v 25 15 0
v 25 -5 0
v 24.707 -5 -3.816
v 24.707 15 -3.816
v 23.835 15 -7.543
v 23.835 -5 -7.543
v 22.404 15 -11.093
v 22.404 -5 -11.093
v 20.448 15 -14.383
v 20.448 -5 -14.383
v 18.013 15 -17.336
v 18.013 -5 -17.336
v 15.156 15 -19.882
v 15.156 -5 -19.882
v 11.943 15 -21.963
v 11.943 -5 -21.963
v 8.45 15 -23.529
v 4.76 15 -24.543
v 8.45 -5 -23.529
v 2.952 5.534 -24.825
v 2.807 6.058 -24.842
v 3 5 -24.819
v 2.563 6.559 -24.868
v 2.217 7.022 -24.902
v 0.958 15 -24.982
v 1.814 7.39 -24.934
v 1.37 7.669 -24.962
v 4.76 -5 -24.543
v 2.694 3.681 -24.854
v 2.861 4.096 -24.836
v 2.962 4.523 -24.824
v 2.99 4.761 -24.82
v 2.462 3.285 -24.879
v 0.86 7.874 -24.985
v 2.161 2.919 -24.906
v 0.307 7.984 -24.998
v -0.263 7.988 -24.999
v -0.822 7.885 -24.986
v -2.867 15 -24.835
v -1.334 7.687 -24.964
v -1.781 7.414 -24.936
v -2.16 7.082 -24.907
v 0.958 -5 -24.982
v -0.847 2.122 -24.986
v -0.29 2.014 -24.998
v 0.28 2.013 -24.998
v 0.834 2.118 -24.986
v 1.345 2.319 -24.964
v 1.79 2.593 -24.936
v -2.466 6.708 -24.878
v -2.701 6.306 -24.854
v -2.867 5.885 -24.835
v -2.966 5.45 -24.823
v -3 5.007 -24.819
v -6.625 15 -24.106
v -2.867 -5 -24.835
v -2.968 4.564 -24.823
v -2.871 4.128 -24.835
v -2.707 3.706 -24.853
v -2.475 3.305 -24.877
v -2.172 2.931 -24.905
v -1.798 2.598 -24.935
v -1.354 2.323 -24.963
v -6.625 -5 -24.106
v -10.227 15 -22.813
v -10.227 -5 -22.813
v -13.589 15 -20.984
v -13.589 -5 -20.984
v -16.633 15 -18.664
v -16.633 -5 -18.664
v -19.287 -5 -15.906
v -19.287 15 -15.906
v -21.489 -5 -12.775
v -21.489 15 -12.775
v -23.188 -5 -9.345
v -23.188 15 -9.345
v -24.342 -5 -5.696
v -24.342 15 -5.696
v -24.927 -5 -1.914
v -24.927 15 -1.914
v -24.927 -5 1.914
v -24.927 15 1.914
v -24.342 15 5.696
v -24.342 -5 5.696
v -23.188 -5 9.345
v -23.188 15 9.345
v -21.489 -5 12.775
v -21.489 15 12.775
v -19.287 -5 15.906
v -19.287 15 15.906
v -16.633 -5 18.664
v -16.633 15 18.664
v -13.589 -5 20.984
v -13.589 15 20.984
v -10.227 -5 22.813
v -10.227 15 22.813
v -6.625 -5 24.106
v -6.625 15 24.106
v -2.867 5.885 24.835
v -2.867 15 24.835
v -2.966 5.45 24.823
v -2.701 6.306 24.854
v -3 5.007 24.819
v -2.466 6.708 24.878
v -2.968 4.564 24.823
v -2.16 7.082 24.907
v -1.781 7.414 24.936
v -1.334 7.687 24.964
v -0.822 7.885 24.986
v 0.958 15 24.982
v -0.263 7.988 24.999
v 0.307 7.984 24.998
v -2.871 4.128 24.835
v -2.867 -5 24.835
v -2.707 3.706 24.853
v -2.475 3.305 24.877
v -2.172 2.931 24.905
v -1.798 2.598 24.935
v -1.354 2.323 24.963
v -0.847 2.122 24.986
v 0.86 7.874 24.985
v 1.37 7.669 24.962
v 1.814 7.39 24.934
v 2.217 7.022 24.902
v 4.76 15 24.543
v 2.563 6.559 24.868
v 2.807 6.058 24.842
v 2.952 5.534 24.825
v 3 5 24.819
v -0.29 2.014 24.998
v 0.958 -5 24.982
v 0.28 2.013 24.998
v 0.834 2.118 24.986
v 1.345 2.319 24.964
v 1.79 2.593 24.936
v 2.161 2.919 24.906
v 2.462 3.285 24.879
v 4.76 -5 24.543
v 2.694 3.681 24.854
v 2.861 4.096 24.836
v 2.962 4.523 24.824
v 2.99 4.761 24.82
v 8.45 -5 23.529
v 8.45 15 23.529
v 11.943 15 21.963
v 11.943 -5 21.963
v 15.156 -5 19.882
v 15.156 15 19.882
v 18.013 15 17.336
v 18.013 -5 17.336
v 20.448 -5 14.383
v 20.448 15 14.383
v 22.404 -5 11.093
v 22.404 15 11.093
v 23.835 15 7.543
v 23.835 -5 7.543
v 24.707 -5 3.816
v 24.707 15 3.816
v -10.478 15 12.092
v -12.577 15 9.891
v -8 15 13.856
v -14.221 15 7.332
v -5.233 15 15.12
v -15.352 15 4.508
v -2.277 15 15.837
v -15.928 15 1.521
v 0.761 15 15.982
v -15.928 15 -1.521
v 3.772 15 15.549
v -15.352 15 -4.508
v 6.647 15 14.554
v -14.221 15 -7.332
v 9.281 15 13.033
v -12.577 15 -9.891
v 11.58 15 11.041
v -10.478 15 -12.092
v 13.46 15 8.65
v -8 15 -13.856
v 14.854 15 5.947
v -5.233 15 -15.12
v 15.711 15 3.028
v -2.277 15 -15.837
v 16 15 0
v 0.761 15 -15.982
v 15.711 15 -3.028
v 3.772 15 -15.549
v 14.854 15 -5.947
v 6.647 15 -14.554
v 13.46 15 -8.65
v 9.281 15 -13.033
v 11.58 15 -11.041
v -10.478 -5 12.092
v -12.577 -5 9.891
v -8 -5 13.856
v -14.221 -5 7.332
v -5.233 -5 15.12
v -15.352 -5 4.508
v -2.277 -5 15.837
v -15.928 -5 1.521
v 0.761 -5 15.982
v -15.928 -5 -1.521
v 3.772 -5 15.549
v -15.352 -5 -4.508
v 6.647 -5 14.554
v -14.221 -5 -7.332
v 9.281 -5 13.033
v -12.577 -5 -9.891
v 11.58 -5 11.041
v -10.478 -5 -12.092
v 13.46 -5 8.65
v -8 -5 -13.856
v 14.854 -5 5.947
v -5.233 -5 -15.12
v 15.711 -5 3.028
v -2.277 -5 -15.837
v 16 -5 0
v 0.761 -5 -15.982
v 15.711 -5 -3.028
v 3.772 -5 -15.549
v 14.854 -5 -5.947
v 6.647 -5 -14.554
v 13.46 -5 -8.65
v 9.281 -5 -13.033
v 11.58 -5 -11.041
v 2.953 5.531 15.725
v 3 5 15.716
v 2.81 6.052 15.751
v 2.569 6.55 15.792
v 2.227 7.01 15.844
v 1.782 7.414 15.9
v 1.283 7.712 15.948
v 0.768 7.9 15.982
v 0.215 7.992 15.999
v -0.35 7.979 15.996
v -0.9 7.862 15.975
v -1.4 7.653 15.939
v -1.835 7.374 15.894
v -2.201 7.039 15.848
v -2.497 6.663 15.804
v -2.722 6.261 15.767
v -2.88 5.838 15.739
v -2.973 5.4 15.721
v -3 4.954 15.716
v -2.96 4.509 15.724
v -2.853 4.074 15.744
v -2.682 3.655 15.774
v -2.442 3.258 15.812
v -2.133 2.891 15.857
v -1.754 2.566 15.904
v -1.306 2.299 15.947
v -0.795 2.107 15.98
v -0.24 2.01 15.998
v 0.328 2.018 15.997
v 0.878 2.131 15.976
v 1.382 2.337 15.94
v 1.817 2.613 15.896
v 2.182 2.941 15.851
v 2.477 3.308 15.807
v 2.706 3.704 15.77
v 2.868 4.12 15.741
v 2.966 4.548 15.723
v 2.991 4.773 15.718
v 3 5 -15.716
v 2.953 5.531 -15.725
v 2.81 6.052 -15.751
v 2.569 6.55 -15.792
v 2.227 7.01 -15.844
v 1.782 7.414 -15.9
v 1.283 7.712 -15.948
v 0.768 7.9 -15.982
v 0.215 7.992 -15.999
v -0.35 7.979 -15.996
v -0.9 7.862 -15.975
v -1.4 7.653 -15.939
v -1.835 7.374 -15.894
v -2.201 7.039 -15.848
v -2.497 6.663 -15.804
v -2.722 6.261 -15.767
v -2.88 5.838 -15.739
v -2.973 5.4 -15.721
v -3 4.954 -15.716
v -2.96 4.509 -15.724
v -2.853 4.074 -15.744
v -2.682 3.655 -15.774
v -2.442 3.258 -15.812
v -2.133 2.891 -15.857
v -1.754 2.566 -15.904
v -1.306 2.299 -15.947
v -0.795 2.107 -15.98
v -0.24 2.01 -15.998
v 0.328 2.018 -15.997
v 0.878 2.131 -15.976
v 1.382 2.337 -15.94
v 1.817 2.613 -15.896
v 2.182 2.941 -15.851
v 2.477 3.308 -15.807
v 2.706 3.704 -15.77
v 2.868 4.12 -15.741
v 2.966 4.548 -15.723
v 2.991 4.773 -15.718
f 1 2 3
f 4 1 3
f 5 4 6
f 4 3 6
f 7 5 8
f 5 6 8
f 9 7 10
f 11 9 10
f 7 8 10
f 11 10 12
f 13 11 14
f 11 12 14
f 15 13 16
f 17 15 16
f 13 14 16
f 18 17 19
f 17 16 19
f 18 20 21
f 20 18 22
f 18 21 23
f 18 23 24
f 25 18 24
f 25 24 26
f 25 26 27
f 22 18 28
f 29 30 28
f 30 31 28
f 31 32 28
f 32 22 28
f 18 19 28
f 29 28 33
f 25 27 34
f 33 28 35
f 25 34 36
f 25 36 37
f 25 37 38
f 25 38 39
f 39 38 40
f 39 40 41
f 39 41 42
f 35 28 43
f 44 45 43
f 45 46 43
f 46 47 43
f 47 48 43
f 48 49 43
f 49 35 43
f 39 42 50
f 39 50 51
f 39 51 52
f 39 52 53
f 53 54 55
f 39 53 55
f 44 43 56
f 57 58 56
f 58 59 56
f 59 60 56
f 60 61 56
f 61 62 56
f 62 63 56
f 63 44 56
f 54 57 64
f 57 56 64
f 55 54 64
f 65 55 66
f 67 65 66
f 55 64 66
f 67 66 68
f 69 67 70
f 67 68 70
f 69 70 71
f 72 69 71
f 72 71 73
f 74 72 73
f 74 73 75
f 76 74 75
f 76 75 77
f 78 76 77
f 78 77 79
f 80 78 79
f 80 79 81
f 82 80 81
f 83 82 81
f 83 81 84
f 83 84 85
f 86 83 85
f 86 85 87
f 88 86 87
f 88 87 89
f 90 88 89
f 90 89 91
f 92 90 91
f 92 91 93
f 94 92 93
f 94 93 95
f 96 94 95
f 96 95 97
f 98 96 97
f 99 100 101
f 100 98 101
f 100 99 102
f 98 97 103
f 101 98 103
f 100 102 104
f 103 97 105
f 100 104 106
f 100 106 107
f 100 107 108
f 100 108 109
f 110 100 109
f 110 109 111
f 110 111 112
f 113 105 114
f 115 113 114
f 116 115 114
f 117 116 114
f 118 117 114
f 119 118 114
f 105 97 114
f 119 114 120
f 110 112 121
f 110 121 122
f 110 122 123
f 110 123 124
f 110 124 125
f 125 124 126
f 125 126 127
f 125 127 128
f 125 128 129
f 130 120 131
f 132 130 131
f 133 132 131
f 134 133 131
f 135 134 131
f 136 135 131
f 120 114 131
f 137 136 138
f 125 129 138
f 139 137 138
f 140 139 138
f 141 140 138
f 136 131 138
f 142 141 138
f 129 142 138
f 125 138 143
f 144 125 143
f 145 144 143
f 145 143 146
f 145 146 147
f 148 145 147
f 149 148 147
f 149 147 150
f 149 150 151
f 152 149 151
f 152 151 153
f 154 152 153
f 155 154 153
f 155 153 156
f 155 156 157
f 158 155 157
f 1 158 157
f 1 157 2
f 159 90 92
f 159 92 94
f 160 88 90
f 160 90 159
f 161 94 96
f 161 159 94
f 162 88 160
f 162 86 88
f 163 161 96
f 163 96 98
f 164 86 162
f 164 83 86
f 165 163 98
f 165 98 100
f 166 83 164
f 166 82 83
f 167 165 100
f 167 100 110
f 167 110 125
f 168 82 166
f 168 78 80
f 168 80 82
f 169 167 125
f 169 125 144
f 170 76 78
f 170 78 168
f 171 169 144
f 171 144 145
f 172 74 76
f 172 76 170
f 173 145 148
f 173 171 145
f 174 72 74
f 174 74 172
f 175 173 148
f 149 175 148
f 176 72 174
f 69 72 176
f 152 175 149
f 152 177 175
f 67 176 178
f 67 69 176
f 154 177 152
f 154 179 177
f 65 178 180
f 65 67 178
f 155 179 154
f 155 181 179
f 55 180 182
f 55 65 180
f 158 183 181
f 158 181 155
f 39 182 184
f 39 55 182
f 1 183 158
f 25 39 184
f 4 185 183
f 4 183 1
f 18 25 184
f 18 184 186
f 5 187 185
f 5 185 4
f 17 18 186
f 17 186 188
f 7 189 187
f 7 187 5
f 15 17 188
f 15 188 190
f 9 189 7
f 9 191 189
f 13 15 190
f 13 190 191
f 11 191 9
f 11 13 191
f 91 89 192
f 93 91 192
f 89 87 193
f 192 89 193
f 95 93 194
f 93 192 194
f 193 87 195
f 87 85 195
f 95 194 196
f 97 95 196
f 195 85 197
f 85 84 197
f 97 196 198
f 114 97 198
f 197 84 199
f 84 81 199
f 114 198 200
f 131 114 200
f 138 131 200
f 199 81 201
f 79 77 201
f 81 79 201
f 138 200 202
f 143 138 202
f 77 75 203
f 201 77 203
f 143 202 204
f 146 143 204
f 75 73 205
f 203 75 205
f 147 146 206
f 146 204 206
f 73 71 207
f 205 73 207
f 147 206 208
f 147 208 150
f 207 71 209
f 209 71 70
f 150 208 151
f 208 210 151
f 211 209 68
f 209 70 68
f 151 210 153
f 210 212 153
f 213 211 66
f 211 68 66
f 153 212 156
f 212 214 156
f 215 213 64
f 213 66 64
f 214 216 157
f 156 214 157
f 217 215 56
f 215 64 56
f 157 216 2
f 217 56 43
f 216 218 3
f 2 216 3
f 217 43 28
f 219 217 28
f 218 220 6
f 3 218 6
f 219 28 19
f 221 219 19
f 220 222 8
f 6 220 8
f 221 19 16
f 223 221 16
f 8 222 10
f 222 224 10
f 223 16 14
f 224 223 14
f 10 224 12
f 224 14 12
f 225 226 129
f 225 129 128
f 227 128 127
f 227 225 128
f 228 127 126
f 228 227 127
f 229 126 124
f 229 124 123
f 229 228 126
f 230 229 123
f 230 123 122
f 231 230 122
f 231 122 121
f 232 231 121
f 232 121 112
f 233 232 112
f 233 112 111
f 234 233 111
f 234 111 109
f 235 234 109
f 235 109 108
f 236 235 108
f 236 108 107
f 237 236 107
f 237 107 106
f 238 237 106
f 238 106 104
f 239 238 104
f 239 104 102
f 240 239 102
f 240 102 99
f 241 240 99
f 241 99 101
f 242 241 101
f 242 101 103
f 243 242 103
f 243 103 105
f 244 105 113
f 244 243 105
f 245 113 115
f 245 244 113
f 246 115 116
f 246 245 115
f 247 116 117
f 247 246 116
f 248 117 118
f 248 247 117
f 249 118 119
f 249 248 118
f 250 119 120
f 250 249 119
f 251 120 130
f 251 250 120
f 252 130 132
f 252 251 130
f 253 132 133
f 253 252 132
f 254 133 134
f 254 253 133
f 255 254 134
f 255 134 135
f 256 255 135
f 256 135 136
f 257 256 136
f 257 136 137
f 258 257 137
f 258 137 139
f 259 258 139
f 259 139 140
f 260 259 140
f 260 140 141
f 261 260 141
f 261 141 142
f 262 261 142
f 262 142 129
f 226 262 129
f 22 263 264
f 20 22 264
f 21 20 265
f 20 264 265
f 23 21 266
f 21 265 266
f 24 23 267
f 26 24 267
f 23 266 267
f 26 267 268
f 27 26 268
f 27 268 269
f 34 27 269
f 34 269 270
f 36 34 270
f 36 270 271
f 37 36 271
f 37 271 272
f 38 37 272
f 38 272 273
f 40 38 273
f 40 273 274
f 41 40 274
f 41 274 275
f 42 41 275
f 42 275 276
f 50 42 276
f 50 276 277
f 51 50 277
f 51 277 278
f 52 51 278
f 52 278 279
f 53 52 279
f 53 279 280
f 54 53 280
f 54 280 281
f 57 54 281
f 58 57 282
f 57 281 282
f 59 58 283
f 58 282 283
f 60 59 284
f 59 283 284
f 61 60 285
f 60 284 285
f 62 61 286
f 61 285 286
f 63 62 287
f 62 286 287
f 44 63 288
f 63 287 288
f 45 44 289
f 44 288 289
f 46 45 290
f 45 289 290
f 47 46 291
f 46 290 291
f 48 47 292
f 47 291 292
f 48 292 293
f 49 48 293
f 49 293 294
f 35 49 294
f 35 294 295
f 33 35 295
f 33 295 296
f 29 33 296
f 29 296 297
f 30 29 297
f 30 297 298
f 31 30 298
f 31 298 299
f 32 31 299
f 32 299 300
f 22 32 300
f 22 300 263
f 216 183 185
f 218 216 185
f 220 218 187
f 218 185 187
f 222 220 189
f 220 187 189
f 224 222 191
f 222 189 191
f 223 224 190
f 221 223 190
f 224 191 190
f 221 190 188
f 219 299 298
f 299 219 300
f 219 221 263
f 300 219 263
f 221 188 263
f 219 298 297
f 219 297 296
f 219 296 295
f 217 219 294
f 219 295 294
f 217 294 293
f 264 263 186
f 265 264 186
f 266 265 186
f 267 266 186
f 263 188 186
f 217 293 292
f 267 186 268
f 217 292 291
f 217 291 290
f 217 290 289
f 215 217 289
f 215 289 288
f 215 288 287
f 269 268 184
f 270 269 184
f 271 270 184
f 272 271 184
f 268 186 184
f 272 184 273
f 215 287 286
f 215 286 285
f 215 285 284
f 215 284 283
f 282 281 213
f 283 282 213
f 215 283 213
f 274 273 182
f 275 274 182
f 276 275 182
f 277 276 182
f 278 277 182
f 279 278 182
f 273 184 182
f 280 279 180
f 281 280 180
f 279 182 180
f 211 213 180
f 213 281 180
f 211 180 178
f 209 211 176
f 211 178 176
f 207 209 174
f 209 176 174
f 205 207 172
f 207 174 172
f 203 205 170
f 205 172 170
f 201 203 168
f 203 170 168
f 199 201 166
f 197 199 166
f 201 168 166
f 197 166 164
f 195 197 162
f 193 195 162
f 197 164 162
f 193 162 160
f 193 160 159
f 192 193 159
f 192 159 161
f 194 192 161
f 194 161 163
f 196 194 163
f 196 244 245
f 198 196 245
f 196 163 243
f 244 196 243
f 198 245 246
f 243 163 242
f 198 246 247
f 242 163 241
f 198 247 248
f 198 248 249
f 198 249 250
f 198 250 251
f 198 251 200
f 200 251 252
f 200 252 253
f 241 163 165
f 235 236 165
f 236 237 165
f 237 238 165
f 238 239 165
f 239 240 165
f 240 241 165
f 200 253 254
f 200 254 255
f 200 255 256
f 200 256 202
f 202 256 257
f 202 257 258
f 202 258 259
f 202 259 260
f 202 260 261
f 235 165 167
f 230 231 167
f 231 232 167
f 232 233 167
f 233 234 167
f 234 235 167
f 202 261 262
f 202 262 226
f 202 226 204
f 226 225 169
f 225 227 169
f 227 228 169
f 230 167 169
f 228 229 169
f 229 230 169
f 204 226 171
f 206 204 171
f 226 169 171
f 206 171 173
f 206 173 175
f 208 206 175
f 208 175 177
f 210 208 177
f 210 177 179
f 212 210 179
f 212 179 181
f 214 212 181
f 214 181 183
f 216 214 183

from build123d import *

# Parameters (mm, degrees)
SKETCH2_R               = 12.5
BOSS_EXTRUDE1_DEPTH     = 10
SKETCH3_R               = 8
CUT_EXTRUDE1_DEPTH      = 10
SKETCH5_R               = 1.5
CUT_EXTRUDE2_DEPTH      = 13.5
CUT_EXTRUDE2_DEPTH_BACK = 13.5
SCALE1_SCALE            = 2


with BuildPart() as part:
    # Sketch2 → Boss-Extrude1 (new body)
    with BuildSketch(Plane(origin=(0, 0, 0), x_dir=(1, 0, 0), z_dir=(0, 1, 0))):
        Circle(SKETCH2_R)
    extrude(amount=BOSS_EXTRUDE1_DEPTH)

    # Sketch3 → Cut-Extrude1 (cut)
    with BuildSketch(Plane(origin=(0, 10, 0), x_dir=(1, 0, 0), z_dir=(0, 1, 0))):
        Circle(SKETCH3_R)
    extrude(amount=-CUT_EXTRUDE1_DEPTH, mode=Mode.SUBTRACT)

    # Sketch5 → Cut-Extrude2 (cut, two sides)
    with BuildSketch(Plane.XY) as cut_extrude2_sk:
        with Locations((0, 5)):
            Circle(SKETCH5_R)
    extrude(amount=CUT_EXTRUDE2_DEPTH, mode=Mode.SUBTRACT)
    extrude(cut_extrude2_sk.sketch, amount=-CUT_EXTRUDE2_DEPTH_BACK, mode=Mode.SUBTRACT)


with BuildPart() as part_1:
    # Scale1: scaled about (1.973e-06, 5.000003293, 0)
    add(part.part.scale(SCALE1_SCALE).moved(Location((-1.973e-06, -5.000003293, 0))))


solid = part_1.part
